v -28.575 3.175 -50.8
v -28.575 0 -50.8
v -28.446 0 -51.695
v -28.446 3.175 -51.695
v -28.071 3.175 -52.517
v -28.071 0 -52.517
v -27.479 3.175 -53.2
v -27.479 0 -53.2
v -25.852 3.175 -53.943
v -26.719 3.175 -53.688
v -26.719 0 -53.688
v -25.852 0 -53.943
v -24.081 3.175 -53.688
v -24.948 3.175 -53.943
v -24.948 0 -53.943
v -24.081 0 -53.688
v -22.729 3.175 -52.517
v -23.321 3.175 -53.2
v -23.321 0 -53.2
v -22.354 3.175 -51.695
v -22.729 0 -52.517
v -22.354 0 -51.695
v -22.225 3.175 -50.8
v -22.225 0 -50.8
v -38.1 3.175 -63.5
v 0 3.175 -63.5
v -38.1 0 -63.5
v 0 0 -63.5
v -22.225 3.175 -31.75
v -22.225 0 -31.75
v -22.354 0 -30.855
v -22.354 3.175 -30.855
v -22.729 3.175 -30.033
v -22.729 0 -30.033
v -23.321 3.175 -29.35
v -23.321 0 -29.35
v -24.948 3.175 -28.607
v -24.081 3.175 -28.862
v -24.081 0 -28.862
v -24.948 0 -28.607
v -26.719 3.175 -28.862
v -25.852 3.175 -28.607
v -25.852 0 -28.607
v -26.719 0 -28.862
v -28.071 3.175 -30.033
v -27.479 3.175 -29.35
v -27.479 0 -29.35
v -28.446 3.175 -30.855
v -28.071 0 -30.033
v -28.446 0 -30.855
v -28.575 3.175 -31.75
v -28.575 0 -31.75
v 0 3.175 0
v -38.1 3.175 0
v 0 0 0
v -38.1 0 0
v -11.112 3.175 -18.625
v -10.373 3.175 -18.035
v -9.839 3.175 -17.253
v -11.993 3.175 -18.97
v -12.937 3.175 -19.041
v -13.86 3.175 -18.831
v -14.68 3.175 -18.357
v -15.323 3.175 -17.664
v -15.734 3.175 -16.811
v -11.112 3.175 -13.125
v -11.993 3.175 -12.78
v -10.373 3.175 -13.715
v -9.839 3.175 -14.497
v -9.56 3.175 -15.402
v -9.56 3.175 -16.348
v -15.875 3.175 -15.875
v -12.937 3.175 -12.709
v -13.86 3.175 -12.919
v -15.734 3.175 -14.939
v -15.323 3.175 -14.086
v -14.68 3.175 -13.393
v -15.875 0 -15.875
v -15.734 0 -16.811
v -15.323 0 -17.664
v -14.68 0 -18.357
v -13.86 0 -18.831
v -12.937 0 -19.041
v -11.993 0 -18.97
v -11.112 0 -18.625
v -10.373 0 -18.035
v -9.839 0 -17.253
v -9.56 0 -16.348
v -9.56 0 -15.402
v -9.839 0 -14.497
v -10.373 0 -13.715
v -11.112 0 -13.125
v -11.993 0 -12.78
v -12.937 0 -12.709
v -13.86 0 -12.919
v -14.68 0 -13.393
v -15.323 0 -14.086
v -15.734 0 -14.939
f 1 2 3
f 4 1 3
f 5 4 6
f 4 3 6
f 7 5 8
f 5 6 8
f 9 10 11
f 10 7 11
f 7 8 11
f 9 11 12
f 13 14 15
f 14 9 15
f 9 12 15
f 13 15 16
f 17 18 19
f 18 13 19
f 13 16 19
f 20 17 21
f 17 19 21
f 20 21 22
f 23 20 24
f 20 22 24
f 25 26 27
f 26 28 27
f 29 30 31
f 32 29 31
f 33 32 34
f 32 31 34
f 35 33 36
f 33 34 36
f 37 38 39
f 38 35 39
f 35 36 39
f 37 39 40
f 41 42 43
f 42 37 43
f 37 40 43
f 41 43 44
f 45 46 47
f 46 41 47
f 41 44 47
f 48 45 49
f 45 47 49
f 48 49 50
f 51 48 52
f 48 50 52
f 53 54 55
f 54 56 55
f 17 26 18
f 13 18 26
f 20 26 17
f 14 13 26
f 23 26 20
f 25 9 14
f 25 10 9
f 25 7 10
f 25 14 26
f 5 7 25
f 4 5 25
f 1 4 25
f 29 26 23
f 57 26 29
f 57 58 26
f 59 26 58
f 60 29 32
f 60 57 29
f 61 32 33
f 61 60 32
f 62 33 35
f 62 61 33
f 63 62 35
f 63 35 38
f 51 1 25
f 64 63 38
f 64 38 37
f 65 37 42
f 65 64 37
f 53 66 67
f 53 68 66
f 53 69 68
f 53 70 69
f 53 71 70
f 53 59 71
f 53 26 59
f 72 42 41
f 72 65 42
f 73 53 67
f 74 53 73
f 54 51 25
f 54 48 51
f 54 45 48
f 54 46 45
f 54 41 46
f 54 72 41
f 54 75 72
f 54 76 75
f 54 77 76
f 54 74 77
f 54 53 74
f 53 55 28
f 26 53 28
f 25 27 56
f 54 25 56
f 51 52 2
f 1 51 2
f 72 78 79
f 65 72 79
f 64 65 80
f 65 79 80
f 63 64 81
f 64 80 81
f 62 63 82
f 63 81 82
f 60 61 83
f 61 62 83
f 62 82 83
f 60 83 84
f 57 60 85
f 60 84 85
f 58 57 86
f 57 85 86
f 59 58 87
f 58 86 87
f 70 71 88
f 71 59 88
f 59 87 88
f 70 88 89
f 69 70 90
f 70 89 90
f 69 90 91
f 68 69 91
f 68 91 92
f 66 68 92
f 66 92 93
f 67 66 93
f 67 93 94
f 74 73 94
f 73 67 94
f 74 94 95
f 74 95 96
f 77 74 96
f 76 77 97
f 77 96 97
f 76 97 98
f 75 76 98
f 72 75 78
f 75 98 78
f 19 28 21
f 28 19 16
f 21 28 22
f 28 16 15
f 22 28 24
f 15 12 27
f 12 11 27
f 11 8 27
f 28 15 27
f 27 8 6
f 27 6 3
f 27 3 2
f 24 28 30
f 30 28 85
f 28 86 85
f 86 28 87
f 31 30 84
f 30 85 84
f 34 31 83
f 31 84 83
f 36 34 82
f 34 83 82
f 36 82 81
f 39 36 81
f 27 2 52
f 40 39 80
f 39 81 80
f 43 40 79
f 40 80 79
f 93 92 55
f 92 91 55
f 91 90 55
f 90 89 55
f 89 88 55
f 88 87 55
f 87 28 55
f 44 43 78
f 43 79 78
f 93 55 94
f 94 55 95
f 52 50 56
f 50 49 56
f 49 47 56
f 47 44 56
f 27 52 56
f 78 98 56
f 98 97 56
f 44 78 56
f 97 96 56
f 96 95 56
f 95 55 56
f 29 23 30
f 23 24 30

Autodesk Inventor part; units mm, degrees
ref_plane "YZ Plane" through (0, 0, 0) normal (1, 0, 0) x (0, 1, 0)
ref_plane "XZ Plane" through (0, 0, 0) normal (0, 1, 0) x (-1, 0, 0)
ref_plane "XY Plane" through (0, 0, 0) normal (0, 0, 1) x (1, 0, 0)
sketch "Sketch1" plane through (0, 0, 0) normal (0, 1, 0) x (-1, 0, 0)
  line L0 (0, -63.5) -> (38.1, -63.5)
  line L1 (38.1, -63.5) -> (38.1, 0)
  line L2 (38.1, 0) -> (0, 0)
  line L3 (0, 0) -> (0, -63.5)
  line L4 (28.575, -31.75) -> (28.575, -50.8)
  line L5 (22.225, -50.8) -> (22.225, -31.75)
  arc A0 (28.575, -31.75) -> (22.225, -31.75) centre (25.4, -31.75) ccw
  arc A1 (22.225, -50.8) -> (28.575, -50.8) centre (25.4, -50.8) ccw
  circle A2 centre (12.7, -15.875) radius 3.175
  dimension "d0" = 38.1
  dimension "d2" = 63.5
  dimension "d3" = 19.05
  dimension "d4" = 50.8
  dimension "d5" = 12.7
  dimension "d6" = 15.875
  dimension "d7" = 25.4
  dimension "d10" = 3.175
  dimension "d11" = 3.175
  dimension "d12" = 6.35
extrude "Extrusion1" add sketch "Sketch1" along normal blind 3.175
equation "\"d2\" = 1.66667 * d0"
equation "\"d3\" = 0.5 * d0"
equation "\"d4\" = 0.8 * d2"
equation "\"d5\" = 0.333333 * d0"
equation "\"d6\" = 0.25 * d2"
equation "\"d7\" = 0.666667 * d0"
equation "\"d10\" = d8"
equation "\"d11\" = d8"
equation "\"d12\" = 2 * d8"
equation "\"d8\" = 0.05 * d2"
properties part number "8.2 Q1"
